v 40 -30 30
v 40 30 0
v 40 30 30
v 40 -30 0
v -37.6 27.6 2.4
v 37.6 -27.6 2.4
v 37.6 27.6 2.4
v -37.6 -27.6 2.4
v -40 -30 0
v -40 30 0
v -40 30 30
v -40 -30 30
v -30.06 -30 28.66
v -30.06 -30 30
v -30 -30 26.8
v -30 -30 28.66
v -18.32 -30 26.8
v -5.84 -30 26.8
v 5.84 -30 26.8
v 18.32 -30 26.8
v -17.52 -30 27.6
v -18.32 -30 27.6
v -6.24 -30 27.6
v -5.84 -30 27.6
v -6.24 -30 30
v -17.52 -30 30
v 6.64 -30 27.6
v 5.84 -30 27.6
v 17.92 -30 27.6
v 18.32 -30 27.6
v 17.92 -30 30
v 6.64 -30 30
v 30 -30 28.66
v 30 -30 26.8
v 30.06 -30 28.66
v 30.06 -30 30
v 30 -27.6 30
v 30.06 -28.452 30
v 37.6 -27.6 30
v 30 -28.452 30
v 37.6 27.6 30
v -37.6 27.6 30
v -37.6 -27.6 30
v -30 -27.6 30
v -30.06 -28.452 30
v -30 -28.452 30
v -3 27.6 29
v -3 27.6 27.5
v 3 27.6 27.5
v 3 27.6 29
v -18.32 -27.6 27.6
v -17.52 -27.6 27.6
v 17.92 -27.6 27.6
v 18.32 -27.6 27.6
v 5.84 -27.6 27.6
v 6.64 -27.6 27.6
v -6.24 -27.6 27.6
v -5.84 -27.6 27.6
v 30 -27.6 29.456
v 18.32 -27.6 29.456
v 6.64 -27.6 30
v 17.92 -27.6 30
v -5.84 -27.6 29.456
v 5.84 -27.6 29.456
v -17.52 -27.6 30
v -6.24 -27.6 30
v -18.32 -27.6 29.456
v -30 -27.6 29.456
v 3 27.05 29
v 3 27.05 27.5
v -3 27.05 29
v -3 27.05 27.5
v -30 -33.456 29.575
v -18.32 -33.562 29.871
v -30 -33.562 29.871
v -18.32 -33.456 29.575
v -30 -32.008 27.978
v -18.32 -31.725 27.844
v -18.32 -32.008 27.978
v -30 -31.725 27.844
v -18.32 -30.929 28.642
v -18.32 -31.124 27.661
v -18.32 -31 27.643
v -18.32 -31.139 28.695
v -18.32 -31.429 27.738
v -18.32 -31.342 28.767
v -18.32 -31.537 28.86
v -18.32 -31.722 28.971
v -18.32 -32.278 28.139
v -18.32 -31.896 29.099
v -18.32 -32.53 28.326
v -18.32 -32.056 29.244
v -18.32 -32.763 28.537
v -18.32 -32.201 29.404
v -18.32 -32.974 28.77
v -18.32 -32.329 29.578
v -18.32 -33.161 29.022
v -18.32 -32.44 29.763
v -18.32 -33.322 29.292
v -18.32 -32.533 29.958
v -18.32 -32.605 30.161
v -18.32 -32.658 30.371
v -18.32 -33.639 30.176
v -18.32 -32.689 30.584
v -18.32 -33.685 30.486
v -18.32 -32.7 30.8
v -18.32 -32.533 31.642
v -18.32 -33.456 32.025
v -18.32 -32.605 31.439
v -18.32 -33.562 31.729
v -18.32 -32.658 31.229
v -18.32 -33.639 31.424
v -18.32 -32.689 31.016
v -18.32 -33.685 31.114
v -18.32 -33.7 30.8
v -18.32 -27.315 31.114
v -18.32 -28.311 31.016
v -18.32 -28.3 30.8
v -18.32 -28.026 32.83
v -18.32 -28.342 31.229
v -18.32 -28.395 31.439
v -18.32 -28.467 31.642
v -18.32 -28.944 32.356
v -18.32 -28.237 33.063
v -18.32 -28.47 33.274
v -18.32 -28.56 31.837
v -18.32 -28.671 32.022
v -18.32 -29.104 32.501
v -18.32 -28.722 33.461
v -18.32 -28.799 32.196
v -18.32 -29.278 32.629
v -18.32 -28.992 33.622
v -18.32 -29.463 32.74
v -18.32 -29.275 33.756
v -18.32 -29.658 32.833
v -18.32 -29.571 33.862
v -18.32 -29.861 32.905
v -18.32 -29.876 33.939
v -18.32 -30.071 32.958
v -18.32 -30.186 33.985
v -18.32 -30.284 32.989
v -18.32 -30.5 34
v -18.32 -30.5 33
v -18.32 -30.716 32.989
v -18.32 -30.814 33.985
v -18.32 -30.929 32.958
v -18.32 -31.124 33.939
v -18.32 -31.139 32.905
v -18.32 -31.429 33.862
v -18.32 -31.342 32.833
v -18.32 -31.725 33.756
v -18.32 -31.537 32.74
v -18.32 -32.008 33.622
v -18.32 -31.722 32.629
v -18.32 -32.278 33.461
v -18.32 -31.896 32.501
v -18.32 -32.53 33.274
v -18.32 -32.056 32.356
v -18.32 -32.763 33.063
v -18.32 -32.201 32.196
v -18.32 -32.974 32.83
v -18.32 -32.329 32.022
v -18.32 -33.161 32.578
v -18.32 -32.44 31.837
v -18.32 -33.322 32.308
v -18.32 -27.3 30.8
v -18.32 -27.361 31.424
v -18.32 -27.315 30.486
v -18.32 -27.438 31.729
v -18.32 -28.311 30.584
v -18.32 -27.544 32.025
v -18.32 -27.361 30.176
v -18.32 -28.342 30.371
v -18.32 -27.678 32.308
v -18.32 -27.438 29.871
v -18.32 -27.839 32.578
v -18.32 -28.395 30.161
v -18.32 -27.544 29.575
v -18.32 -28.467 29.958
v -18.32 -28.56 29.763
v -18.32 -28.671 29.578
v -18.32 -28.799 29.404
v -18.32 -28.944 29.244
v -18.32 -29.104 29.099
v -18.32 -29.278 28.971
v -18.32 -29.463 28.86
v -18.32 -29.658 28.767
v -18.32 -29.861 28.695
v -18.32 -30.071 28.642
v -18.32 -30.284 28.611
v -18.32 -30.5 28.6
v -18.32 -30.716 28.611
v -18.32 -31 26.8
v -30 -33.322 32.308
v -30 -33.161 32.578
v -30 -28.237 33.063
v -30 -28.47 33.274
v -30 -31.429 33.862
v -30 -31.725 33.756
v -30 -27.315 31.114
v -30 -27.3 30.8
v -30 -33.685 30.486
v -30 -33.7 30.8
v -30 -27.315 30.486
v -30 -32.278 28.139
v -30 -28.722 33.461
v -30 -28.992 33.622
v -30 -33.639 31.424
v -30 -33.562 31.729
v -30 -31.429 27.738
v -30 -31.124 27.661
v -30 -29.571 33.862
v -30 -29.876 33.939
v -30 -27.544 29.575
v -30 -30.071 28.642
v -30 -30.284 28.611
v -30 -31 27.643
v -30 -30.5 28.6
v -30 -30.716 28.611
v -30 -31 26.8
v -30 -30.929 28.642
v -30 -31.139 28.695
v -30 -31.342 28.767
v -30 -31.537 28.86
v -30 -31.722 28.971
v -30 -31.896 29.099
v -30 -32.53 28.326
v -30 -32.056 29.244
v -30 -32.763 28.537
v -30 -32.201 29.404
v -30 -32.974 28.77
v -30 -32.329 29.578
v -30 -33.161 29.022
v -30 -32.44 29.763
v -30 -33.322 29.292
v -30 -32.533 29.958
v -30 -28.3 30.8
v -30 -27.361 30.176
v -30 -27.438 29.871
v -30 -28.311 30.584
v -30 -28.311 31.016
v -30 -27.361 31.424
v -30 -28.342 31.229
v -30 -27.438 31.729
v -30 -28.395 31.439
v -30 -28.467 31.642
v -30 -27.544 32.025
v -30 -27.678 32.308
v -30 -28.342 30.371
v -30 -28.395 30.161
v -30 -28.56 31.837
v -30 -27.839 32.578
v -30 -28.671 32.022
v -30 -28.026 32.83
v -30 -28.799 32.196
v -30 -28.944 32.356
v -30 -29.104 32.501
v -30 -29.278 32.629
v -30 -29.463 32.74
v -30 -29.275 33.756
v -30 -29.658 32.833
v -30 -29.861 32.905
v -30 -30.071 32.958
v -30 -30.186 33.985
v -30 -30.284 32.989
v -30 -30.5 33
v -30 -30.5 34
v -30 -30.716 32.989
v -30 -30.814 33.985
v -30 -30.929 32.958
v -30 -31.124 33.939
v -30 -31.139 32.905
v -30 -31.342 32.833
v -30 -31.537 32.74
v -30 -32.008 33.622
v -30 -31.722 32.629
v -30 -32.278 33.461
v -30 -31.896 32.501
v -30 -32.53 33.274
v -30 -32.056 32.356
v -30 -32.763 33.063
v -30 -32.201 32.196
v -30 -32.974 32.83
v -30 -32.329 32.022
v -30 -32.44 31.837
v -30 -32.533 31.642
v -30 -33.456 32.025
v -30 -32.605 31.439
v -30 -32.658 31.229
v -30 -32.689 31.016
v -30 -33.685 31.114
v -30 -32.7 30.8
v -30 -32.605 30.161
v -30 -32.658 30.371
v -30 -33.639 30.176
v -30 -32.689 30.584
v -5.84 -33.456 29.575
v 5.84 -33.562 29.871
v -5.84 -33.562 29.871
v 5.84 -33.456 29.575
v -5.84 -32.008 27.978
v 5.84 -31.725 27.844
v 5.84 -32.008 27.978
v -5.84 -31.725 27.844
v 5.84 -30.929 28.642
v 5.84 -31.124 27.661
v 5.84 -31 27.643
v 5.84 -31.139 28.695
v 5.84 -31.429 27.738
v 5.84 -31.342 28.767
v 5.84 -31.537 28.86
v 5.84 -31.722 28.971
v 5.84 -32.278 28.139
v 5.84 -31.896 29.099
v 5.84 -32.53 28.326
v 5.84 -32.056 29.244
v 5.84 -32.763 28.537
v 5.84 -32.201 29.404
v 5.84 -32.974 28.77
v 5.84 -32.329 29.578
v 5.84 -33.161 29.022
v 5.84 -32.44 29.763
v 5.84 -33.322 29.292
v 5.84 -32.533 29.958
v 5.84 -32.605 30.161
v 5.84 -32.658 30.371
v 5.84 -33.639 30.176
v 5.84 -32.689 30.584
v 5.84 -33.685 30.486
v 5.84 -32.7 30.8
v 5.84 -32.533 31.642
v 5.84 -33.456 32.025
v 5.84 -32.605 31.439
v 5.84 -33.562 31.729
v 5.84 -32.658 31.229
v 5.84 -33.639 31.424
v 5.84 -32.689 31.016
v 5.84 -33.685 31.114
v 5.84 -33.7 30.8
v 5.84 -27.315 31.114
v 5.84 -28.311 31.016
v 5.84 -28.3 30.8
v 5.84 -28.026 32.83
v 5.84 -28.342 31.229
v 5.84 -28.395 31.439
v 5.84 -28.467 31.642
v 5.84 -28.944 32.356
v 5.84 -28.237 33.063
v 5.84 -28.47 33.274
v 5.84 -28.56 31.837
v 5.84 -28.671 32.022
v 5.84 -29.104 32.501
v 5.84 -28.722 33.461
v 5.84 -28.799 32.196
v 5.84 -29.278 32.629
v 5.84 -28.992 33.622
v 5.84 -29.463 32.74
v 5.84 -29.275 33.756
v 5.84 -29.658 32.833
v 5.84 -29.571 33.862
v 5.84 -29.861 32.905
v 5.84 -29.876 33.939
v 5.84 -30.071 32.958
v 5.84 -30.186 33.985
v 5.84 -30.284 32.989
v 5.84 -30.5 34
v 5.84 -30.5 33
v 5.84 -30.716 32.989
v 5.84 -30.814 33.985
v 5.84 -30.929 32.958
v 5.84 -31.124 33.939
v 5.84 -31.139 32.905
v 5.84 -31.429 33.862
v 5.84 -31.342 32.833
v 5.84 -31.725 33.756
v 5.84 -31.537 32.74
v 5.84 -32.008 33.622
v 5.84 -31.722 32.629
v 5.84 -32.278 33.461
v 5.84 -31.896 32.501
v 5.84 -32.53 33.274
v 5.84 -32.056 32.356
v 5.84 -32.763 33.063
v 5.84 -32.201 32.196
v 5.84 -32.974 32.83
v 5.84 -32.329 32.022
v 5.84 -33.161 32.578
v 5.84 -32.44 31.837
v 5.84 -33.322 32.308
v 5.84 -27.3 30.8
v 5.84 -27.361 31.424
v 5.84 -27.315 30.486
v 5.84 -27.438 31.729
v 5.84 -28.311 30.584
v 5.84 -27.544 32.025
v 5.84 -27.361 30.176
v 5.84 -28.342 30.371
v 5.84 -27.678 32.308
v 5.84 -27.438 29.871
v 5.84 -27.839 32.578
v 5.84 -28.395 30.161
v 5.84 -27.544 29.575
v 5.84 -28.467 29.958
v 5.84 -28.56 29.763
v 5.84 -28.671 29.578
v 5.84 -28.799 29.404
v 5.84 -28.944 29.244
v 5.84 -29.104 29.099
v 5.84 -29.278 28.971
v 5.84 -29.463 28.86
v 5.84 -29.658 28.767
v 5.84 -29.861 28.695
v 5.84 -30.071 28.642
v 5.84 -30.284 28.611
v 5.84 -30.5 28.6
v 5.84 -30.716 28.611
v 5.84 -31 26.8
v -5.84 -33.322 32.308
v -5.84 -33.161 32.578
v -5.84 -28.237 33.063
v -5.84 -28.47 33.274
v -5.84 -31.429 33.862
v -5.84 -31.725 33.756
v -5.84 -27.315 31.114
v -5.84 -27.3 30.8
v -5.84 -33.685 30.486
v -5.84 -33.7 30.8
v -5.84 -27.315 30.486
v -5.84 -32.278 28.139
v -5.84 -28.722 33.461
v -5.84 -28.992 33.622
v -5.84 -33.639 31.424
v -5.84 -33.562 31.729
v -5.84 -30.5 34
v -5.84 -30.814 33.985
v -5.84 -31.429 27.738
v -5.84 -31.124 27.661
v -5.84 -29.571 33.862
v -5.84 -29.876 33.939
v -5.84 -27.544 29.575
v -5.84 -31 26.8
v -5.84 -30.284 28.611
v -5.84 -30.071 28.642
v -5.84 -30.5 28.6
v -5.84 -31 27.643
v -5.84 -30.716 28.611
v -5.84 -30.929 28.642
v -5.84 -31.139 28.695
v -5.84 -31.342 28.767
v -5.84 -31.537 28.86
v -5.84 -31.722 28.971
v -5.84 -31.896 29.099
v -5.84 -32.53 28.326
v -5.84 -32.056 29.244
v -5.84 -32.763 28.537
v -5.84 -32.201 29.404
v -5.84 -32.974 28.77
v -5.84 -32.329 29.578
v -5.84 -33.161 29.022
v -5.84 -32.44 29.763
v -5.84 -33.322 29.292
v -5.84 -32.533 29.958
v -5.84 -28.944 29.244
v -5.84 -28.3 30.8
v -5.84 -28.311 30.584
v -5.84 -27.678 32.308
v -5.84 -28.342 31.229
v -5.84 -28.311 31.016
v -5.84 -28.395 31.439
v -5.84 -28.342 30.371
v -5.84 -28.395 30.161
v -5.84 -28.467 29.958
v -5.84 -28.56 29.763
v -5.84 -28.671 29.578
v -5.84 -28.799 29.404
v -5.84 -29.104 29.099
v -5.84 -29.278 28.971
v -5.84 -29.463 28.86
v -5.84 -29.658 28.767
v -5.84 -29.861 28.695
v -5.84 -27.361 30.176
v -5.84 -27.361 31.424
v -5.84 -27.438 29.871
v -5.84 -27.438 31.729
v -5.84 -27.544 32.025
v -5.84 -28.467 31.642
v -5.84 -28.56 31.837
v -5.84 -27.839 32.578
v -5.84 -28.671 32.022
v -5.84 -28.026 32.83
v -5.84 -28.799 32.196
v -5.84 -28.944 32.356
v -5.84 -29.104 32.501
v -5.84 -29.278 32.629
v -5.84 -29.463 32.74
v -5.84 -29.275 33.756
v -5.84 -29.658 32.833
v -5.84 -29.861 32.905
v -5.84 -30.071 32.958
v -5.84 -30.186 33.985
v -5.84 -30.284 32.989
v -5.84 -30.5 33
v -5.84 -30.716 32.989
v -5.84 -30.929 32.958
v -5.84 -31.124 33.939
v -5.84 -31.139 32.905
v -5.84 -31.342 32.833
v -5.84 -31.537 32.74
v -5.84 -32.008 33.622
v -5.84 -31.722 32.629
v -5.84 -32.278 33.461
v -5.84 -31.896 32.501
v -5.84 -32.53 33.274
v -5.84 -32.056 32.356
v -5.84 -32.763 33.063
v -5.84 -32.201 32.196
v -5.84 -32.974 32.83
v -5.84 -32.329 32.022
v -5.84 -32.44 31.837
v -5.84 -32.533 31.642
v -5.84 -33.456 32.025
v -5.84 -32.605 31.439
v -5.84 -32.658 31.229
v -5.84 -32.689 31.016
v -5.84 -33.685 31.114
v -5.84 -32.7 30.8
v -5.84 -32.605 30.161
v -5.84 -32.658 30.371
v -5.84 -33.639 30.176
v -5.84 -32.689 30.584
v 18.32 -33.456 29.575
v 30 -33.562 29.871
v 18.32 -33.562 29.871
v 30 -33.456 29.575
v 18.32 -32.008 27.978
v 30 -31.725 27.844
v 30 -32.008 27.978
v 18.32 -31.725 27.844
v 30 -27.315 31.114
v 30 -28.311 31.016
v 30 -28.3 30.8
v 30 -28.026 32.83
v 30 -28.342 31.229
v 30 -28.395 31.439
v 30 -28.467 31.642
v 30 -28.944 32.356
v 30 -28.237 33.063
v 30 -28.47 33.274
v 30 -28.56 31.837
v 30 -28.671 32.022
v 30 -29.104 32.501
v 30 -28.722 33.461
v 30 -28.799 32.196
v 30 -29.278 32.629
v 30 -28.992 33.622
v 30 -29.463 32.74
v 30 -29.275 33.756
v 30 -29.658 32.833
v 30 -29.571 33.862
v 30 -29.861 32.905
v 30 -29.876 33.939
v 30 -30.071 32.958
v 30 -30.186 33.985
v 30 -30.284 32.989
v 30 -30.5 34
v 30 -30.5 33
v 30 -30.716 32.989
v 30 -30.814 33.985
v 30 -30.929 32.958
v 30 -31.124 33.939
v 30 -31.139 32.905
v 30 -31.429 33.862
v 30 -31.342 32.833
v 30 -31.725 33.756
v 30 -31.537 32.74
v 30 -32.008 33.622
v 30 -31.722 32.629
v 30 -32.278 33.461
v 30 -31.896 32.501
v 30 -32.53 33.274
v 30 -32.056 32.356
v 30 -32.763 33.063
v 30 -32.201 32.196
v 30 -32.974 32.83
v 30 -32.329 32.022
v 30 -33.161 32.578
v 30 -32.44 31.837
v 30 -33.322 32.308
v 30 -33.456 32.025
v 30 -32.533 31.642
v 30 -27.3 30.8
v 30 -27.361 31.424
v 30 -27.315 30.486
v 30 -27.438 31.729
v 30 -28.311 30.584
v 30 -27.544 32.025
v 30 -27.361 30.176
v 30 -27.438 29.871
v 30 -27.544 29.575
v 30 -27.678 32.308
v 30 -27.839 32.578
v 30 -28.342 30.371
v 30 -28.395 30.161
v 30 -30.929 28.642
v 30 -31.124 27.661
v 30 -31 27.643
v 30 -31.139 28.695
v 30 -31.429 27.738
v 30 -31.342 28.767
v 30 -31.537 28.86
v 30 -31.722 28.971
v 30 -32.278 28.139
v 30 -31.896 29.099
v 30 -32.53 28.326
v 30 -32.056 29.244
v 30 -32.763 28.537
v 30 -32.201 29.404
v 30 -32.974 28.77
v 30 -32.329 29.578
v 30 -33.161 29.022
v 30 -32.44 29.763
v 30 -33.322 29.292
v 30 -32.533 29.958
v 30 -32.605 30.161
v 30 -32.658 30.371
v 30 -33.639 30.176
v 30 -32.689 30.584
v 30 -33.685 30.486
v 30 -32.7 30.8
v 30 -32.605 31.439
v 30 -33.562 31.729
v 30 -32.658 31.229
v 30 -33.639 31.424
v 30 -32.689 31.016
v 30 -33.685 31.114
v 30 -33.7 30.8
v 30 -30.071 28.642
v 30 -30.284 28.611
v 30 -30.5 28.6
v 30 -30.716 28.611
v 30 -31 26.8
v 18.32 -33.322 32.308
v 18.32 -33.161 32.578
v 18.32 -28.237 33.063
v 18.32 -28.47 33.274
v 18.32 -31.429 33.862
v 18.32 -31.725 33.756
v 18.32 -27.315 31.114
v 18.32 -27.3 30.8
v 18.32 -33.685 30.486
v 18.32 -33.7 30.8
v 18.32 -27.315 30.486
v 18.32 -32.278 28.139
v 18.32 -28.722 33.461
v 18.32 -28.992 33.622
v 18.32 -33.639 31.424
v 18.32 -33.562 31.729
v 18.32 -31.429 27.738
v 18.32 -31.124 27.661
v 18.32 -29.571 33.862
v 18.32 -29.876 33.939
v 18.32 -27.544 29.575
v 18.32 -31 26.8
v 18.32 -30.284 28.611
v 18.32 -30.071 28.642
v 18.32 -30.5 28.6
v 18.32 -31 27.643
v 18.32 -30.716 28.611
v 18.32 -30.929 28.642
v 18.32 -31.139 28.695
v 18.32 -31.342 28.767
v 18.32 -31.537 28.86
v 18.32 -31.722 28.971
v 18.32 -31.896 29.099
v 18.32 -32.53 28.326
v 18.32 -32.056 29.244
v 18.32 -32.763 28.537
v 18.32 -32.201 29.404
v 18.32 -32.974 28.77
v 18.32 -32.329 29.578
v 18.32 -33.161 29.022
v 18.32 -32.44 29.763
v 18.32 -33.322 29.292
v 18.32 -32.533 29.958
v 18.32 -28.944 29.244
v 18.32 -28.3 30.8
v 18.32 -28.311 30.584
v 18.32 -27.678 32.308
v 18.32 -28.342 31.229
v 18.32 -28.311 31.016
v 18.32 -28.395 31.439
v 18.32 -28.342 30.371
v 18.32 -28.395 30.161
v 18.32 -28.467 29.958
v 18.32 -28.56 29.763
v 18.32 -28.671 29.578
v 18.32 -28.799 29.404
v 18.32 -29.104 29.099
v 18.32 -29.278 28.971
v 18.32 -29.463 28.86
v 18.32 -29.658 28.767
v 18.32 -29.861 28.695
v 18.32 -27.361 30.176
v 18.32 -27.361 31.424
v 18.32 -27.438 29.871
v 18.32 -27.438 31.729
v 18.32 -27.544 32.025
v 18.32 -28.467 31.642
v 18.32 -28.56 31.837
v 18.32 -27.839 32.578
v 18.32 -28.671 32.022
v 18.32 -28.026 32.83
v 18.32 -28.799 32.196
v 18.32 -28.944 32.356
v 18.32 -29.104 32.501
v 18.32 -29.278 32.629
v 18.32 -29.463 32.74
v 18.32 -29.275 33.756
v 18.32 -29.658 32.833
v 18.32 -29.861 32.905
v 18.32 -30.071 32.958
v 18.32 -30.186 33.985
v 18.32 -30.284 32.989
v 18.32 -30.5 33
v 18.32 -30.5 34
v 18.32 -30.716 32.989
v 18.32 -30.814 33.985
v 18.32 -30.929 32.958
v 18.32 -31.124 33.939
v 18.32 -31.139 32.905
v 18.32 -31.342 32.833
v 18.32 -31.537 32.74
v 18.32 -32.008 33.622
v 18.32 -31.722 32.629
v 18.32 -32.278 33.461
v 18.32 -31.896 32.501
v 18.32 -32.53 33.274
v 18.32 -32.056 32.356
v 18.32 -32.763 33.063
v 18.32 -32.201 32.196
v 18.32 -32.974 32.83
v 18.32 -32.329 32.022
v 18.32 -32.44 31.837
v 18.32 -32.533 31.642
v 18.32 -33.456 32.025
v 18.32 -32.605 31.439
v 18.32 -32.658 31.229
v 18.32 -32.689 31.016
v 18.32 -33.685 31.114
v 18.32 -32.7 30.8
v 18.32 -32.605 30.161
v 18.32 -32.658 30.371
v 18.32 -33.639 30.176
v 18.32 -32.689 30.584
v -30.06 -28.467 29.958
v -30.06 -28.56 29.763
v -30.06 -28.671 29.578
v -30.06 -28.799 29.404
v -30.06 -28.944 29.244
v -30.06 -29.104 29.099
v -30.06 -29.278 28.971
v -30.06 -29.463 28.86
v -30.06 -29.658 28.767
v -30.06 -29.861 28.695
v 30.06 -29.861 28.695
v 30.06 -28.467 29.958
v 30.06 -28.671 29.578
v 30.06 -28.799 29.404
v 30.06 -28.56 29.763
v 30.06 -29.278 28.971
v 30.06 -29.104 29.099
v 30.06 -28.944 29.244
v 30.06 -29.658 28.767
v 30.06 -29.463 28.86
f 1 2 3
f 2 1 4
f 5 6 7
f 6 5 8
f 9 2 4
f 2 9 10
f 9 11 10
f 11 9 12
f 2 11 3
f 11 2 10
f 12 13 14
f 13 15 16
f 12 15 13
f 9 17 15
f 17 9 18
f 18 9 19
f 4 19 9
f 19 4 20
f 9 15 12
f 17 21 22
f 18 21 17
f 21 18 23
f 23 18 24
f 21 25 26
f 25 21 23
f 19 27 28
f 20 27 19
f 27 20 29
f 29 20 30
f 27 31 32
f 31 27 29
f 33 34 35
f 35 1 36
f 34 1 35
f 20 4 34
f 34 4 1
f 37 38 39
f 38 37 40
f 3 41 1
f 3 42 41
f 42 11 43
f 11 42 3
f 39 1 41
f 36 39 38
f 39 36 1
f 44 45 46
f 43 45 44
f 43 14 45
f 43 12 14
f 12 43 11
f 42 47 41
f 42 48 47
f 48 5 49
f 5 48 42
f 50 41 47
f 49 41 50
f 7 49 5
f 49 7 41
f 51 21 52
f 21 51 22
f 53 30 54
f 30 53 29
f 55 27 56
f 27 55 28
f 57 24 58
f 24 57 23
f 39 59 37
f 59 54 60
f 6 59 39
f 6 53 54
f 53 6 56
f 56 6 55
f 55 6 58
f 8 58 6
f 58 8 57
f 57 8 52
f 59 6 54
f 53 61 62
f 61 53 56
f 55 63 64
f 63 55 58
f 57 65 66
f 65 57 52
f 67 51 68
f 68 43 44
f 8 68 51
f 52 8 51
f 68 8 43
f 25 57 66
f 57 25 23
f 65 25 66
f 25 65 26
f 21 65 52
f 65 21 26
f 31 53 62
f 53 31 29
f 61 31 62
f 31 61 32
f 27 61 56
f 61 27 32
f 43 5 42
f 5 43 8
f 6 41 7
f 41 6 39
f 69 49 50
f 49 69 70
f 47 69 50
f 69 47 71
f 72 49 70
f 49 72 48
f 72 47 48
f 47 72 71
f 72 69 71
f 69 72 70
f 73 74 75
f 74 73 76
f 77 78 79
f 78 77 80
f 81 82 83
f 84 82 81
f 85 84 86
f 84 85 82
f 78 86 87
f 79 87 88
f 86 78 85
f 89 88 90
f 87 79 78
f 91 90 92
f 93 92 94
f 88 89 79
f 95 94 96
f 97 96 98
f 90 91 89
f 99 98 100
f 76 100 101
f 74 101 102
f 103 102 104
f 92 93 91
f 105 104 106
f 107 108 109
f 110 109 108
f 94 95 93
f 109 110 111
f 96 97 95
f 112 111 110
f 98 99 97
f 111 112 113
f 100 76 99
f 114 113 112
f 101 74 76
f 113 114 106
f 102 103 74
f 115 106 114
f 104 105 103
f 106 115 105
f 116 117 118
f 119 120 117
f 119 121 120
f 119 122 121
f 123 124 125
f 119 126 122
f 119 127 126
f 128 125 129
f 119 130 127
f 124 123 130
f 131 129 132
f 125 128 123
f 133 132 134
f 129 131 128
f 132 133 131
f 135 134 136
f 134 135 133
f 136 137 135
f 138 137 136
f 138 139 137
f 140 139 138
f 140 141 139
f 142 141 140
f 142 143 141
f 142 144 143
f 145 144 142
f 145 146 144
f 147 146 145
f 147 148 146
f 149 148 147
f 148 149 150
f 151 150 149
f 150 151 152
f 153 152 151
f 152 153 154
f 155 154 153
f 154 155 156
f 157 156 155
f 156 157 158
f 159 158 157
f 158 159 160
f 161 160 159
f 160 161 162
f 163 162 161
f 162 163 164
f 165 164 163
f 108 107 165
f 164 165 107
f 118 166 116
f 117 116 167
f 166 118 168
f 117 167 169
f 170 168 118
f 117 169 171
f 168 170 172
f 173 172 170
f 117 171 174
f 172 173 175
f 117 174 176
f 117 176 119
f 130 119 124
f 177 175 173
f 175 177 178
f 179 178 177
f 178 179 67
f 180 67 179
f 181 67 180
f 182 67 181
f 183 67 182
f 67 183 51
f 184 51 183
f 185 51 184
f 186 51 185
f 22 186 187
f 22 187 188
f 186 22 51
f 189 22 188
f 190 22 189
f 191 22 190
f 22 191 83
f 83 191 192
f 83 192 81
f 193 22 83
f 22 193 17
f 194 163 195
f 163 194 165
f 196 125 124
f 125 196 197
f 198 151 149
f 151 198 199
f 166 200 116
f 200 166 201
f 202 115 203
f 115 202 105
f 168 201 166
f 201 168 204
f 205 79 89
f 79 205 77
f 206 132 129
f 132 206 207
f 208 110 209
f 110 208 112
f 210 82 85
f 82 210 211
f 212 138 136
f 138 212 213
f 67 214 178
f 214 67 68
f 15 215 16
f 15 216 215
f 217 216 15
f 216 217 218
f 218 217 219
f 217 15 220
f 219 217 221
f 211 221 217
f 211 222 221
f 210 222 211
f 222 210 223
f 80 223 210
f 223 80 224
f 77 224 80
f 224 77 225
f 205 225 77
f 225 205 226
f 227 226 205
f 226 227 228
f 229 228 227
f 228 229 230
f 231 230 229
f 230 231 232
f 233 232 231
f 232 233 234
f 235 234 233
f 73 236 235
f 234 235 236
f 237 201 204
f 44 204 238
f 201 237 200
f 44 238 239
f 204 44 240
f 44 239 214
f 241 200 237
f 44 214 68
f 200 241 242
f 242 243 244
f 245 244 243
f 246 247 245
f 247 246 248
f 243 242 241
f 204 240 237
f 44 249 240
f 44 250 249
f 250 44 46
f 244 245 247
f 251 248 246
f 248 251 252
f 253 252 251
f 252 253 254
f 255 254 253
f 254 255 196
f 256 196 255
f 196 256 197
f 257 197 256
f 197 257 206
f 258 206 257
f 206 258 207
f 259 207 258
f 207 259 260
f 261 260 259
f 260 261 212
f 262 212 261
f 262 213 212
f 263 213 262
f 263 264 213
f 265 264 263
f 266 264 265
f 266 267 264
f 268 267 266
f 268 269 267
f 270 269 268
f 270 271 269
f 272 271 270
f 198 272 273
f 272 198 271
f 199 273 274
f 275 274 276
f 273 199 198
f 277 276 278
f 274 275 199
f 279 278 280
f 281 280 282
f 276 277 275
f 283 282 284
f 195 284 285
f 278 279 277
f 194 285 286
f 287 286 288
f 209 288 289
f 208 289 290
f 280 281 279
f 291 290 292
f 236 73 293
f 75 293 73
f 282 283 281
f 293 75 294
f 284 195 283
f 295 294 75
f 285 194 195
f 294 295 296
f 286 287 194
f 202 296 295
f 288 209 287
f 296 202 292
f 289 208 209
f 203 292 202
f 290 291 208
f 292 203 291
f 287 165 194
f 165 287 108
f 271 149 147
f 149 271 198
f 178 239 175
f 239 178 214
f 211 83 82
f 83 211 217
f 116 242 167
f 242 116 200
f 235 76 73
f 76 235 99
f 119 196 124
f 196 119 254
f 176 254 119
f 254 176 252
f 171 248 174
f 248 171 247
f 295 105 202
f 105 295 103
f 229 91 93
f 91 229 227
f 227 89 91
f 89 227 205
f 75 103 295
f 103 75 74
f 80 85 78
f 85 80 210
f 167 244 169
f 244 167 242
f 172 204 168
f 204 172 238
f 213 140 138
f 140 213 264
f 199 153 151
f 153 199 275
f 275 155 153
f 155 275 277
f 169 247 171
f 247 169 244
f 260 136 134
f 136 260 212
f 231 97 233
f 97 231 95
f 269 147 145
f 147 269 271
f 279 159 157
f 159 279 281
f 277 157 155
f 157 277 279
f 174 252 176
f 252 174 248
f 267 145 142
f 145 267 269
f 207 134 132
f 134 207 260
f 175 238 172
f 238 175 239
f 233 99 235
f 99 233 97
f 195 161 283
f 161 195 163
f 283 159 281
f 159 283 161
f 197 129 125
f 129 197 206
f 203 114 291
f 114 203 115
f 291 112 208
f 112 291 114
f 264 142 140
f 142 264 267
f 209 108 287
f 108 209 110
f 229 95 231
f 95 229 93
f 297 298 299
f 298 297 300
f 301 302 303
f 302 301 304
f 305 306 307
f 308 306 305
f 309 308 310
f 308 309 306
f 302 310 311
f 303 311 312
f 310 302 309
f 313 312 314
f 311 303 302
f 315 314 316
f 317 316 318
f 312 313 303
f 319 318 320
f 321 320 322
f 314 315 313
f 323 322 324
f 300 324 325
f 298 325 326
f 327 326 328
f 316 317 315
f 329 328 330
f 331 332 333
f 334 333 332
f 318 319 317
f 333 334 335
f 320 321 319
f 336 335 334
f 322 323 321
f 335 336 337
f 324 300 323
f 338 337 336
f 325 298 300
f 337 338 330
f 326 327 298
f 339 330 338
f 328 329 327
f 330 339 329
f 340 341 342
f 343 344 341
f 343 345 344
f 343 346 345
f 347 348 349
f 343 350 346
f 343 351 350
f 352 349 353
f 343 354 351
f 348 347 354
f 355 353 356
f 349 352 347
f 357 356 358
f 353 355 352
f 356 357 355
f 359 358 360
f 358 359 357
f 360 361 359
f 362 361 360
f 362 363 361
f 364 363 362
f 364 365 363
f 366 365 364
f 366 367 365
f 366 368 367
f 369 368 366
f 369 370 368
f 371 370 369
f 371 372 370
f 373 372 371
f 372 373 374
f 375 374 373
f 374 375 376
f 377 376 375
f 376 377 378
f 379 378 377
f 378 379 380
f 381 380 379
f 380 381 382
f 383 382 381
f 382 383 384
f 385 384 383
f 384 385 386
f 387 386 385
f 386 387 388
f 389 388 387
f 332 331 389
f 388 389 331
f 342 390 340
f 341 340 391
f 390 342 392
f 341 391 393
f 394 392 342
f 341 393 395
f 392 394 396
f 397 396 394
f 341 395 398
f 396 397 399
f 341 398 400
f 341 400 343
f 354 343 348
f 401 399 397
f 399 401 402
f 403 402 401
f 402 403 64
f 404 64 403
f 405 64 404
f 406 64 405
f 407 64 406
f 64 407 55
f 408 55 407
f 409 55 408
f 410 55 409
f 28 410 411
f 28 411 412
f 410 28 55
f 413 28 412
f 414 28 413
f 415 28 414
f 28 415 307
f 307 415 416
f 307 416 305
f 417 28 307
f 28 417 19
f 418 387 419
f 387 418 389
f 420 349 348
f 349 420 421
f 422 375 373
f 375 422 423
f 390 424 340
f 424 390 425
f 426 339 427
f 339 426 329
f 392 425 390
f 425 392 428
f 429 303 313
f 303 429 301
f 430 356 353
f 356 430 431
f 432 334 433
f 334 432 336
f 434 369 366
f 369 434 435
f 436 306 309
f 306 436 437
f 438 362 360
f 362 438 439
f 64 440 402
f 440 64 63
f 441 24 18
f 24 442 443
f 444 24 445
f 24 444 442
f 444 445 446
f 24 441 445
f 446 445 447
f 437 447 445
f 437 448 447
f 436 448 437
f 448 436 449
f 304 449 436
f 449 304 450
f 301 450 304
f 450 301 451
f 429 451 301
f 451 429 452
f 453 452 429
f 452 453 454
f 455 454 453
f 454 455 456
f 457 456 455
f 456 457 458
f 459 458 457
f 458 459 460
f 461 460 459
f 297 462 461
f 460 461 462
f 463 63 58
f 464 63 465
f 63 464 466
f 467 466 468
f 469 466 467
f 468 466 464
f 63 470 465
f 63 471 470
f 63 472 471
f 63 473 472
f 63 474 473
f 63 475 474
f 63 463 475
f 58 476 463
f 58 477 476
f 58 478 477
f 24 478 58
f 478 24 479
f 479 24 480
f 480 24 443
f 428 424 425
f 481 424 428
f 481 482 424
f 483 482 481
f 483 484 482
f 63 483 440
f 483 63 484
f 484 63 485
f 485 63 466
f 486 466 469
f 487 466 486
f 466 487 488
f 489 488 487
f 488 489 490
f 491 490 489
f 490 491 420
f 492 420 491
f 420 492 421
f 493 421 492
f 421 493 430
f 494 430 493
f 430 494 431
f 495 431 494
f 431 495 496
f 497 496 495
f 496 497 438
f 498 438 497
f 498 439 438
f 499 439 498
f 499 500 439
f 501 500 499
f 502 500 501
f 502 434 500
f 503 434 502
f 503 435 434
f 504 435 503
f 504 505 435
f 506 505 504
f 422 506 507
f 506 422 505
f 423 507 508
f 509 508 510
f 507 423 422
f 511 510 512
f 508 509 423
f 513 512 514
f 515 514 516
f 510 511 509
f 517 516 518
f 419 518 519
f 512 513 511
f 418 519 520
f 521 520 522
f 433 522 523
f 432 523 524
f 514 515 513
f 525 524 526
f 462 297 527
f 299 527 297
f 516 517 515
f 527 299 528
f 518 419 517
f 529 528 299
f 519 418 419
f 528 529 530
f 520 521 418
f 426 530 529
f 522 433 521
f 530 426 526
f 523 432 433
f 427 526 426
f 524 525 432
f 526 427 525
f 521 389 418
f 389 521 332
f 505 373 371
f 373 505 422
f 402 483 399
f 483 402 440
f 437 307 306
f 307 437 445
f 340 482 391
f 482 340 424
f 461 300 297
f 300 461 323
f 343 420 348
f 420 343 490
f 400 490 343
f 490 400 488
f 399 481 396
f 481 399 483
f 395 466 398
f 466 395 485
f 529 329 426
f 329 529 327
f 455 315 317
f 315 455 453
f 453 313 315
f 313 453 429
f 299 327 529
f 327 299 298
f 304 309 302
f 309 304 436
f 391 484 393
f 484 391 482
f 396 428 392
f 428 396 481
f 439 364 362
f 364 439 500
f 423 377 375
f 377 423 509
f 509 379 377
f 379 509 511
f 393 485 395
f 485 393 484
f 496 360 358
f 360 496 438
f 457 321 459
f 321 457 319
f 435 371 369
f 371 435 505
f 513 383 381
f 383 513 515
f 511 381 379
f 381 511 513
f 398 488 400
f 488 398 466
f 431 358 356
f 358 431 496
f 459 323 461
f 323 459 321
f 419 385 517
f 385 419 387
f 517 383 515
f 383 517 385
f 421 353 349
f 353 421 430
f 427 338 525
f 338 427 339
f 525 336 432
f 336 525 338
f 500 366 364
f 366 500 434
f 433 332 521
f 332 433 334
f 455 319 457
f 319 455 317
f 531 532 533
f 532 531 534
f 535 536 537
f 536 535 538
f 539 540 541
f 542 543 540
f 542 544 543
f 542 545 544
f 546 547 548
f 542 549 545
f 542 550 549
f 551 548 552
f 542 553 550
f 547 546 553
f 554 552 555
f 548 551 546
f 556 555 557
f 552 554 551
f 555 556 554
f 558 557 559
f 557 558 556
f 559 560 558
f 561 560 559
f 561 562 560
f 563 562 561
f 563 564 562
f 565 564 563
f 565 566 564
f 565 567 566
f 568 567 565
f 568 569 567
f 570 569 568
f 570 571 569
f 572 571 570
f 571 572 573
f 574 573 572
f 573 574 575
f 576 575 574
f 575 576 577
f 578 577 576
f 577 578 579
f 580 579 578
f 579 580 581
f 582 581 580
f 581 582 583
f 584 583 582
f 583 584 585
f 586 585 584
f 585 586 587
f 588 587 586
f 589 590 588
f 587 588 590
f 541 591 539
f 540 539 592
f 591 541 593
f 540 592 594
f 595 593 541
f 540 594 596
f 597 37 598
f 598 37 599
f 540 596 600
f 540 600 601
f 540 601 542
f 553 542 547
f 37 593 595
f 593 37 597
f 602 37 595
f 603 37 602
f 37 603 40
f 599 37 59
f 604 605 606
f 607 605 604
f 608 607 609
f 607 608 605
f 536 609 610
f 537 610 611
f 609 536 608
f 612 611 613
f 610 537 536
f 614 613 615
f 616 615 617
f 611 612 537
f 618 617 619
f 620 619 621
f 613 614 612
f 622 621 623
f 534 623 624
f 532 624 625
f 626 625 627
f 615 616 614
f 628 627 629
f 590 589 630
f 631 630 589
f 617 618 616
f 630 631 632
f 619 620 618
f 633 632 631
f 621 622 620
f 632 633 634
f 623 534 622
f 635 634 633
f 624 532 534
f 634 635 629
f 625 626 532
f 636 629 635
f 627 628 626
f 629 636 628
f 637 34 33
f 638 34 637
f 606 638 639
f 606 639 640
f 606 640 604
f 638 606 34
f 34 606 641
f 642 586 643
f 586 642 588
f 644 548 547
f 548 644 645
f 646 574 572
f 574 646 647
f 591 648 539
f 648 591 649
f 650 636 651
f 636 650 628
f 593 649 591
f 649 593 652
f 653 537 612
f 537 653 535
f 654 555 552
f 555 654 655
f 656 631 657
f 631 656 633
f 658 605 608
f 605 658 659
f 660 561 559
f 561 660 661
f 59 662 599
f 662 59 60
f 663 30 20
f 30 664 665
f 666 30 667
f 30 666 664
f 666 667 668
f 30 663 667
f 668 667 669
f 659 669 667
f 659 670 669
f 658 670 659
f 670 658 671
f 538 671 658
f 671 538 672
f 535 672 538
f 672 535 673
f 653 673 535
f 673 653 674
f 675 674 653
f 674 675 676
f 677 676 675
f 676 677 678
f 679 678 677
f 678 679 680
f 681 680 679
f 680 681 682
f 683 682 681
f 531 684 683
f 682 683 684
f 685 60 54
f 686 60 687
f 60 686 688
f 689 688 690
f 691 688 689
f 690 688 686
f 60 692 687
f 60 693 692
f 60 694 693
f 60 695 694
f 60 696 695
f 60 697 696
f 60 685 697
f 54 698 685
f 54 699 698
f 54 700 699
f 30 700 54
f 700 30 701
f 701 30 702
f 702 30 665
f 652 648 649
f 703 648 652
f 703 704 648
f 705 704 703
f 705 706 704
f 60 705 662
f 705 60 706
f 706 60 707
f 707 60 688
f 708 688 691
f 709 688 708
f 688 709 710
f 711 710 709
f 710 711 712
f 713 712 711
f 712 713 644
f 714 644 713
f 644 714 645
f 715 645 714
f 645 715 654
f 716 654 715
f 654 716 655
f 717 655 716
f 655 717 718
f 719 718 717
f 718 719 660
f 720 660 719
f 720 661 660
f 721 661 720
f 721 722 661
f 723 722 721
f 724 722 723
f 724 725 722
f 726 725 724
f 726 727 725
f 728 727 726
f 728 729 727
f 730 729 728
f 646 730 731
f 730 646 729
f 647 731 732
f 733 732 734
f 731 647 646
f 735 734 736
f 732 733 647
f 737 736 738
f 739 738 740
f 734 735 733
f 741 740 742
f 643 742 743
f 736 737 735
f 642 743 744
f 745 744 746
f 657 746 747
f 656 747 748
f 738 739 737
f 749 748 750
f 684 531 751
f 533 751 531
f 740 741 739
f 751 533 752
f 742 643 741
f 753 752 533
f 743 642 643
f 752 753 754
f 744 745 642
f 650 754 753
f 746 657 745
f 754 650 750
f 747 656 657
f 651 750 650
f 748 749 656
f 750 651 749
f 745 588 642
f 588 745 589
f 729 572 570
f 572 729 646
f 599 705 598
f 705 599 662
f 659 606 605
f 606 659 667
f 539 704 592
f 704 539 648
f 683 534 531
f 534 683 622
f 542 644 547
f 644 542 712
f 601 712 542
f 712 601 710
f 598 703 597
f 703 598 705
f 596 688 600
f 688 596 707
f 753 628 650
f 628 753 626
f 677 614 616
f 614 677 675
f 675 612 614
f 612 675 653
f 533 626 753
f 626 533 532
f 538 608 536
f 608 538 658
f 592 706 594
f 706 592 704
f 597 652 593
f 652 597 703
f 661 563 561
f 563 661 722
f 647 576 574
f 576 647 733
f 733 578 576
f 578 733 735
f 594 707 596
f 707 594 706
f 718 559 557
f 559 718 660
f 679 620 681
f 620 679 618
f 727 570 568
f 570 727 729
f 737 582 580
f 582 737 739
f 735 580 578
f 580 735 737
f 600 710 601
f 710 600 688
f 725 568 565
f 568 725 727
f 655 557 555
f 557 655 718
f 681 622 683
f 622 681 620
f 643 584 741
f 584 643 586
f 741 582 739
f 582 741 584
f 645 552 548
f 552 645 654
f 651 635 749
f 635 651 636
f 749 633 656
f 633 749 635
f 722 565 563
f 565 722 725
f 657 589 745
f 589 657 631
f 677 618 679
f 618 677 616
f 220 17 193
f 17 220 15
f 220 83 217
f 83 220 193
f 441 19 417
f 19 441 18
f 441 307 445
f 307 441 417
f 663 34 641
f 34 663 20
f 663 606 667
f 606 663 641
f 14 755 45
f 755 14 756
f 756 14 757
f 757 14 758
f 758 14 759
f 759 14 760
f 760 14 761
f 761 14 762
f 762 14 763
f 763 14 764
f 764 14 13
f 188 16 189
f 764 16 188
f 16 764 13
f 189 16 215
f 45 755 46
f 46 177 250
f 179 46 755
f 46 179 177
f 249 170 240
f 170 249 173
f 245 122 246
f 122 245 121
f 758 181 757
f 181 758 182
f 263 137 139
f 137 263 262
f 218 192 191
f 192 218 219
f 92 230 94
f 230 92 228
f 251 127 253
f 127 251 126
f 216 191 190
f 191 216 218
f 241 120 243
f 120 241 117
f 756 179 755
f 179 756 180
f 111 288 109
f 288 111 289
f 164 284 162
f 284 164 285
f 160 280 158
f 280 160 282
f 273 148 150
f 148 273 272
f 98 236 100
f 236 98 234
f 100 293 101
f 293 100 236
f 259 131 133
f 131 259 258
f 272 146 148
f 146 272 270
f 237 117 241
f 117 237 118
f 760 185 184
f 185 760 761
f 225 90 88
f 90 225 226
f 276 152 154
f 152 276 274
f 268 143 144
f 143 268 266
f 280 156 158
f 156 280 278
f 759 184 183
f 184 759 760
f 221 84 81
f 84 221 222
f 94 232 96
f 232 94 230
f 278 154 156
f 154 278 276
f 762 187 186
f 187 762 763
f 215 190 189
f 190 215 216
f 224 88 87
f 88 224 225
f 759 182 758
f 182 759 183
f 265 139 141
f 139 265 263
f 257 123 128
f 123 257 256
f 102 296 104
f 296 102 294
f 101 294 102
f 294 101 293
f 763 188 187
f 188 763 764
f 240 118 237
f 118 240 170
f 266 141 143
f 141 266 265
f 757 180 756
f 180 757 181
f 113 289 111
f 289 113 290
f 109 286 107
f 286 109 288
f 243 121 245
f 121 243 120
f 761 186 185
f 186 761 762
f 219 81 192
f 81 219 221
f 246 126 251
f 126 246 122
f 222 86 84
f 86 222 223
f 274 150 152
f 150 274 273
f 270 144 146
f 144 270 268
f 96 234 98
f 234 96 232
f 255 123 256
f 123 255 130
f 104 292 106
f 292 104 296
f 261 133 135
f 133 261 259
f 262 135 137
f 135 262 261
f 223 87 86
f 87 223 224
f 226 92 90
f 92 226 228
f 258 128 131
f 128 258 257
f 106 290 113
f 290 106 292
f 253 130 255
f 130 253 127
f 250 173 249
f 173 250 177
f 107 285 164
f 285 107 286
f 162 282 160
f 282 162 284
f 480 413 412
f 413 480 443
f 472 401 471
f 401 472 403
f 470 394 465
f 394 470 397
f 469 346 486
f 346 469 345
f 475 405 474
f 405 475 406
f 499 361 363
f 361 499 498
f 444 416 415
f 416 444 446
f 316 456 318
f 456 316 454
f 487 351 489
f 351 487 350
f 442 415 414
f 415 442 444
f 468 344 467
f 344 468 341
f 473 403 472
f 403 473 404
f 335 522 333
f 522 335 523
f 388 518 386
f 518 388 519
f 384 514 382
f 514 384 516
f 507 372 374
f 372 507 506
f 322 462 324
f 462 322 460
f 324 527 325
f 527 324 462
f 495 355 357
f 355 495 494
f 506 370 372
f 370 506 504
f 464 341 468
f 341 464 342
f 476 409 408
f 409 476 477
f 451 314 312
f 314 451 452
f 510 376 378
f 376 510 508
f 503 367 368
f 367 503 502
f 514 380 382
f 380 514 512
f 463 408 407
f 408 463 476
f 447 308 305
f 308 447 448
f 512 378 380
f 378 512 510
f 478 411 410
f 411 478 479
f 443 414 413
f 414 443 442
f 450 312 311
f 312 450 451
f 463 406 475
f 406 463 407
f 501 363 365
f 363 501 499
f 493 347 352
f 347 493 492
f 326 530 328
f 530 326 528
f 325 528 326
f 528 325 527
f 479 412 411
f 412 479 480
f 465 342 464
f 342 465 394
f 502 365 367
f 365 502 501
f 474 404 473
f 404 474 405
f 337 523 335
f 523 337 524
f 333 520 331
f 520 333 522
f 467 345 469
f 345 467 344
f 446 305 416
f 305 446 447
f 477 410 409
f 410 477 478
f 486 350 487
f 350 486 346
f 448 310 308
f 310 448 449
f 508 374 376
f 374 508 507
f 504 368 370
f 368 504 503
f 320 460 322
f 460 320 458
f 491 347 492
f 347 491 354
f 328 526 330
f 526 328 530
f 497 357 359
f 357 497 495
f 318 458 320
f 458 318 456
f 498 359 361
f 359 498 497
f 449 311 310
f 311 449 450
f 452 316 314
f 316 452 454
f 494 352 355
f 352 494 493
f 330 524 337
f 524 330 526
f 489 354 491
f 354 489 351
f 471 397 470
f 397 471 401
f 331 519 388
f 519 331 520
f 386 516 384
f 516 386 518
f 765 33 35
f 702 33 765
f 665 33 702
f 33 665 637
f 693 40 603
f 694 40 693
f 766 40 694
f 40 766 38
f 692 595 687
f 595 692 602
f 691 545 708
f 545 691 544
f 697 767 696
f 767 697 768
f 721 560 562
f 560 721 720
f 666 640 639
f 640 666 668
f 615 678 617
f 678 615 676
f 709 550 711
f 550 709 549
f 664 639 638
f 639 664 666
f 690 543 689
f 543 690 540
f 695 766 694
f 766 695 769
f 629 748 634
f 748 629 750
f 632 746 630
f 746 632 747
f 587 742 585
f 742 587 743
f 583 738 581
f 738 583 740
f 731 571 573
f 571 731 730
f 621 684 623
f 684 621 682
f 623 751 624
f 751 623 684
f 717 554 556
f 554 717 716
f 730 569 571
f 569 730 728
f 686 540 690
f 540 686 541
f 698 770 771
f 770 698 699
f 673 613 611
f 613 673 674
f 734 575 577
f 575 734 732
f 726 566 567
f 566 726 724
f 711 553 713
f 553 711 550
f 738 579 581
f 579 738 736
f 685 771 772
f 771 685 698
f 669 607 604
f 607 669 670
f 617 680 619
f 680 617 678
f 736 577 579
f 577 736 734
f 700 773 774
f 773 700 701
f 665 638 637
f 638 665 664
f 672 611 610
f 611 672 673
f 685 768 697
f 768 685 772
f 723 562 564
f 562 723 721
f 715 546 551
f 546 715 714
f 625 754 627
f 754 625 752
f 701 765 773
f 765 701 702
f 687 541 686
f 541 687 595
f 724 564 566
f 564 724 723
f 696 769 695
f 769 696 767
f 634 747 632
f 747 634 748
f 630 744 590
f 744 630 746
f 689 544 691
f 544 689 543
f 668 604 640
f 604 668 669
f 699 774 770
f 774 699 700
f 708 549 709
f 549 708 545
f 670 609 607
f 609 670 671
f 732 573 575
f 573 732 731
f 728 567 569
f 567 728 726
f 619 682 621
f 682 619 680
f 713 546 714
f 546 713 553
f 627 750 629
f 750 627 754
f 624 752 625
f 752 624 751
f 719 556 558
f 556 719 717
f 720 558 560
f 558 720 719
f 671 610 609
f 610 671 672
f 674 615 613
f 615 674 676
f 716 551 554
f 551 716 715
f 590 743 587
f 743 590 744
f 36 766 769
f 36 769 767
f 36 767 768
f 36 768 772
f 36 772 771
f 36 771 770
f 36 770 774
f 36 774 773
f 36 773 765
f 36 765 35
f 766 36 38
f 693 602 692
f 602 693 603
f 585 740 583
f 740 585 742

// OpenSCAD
// Box with print-in-place hinge (v4: bridge webs to kill band overhangs)
part = "box";
// [box, lid, pin, assembly]
cadverify_only = "";
module instance(name, part, unit = 1) {
    echo(cadverify_instance = [name, part, unit]);
    if (cadverify_only == "" || cadverify_only == name) children();
}

Rkn = 3.2; rbore = 2.2; rpin = 1.9;
yh = -30.5; zh = 30.8;
lid_zh = 3.4;
lid_lift = 27.4;
pin_lift_z = 27.8; pin_shift_y = -30.5;
k0x0=-30; k0x1=-18.32;
k1x0=-17.92; k1x1=-6.24;
k2x0=-5.84; k2x1=5.84;
k3x0=6.24; k3x1=17.92;
k4x0=18.32; k4x1=30;

$fn = 64;

module xcyl(x0, x1, r, y, z) {
    translate([x0, y, z]) rotate([0, 90, 0]) cylinder(r = r, h = x1 - x0);
}

module box_part() {
    difference() {
        union() {
            translate([-40, -30, 0]) cube([80, 60, 2.4]);
            translate([-40, 27.6, 2.4]) cube([80, 2.4, 27.6]);
            translate([-40, -30, 2.4]) cube([80, 2.4, 27.6 - 2.4]);
            // top band of back wall split into segs clearing lid knuckles axially (0.4 gap each side)
            translate([-40, -30, 27.0]) cube([11.88, 2.4, 3.0]);
            translate([-17.52, -30, 27.0]) cube([11.28, 2.4, 3.0]);
            translate([6.64, -30, 27.0]) cube([11.28, 2.4, 3.0]);
            translate([28.12, -30, 27.0]) cube([11.88, 2.4, 3.0]);
            translate([-40, -27.6, 2.4]) cube([2.4, 55.2, 27.6]);
            translate([37.6, -27.6, 2.4]) cube([2.4, 55.2, 27.6]);
            translate([-3, 27.05, 27.5]) cube([6, 0.6, 1.5]);
            // hinge knuckles + support webs tying them to the back wall
            xcyl(k0x0, k0x1, Rkn, yh, zh);
            xcyl(k2x0, k2x1, Rkn, yh, zh);
            xcyl(k4x0, k4x1, Rkn, yh, zh);
            translate([k0x0, -31, 26.8]) cube([k0x1-k0x0, 3.4, 4.0]);
            translate([k2x0, -31, 26.8]) cube([k2x1-k2x0, 3.4, 4.0]);
            translate([k4x0, -31, 26.8]) cube([k4x1-k4x0, 3.4, 4.0]);
        }
        xcyl(k0x0-0.06, k0x1+0.06, rbore, yh, zh);
        xcyl(k2x0-0.06, k2x1+0.06, rbore, yh, zh);
        xcyl(k4x0-0.06, k4x1+0.06, rbore, yh, zh);
    }
}

module lid_part() {
    difference() {
        union() {
            translate([-40, -30, 10.6]) cube([80, 60, 2.4]);
            translate([-40, 27.6, 3]) cube([80, 2.4, 7.6]);
            translate([-17.92, -30, 3]) cube([11.68, 2.4, 7.6]);
            translate([6.24, -30, 3]) cube([11.68, 2.4, 7.6]);
            translate([-40, -30, 3]) cube([9.6, 2.4, 7.6]);
            translate([-5.44, -30, 3]) cube([10.88, 2.4, 7.6]);
            translate([18.72, -30, 3]) cube([10.88, 2.4, 7.6]);
            translate([30.4, -30, 3]) cube([9.6, 2.4, 7.6]);
            translate([-40, -27.6, 3]) cube([2.4, 55.2, 7.6]);
            translate([37.6, -27.6, 3]) cube([2.4, 55.2, 7.6]);
            translate([-37.2, 25.2, 0]) cube([74.4, 2.0, 10.6]);
            translate([-37.2, -27.2, 0]) cube([74.4, 2.0, 10.6]);
            translate([-37.2, -25.2, 0]) cube([2.0, 50.4, 10.6]);
            translate([35.2, -25.2, 0]) cube([2.0, 50.4, 10.6]);
            xcyl(k1x0, k1x1, Rkn, yh, lid_zh);
            xcyl(k3x0, k3x1, Rkn, yh, lid_zh);
            translate([k1x0, -31, 0]) cube([k1x1-k1x0, 3.4, 5]);
            translate([k3x0, -31, 0]) cube([k3x1-k3x0, 3.4, 5]);
        }
        xcyl(k1x0-0.06, k1x1+0.06, rbore, yh, lid_zh);
        xcyl(k3x0-0.06, k3x1+0.06, rbore, yh, lid_zh);
        translate([-3.25, 26.5, -0.05]) cube([6.5, 1.35, 2.05]);
    }
}

module pin_part() {
    union() {
        xcyl(-32.4, 32.4, rpin, 0, 3);
        xcyl(30.4, 32.4, 3, 0, 3);
        xcyl(-32.4, -30.4, 3, 0, 3);
    }
}

if (part == "box") {
    echo(cadverify_spec = [
        ["bounds", [[-40, -33.7, 0], [40, 30, 34.0]]],
        ["bodies", 1],
        ["through_holes", 3],
        ["support_faces", [["bed", "-z", 4000]]],
        ["overhangs_allowed", [["hinge knuckles, bores and wall cutouts print in place", [[-30.2, -33.9, 26.5], [30.2, -27.1, 33.5]]], ["catch bump underside, tiny 3.6 mm2 ledge", [[-3.2, 26.8, 27.3], [3.2, 27.8, 27.7]]]]],
        ["copies", 1],
        ["details", [
            ["floor", "thickness", [0, 0, -1], [0, 0, 1], 2.4],
            ["front_wall", "thickness", [0, 31, 15], [0, -1, 0], 2.4],
            ["cavity", "void", [[-37.6, -27.6, 2.4], [37.6, 27.6, 29.9]], 0.9],
            ["hinge_bore", "hole", [-31, -30.5, 30.8], [1, 0, 0], [[0, 4.4], [11.6, 4.4]]],
            ["catch_bump", "material", [[-3, 27.05, 27.5], [3, 27.6, 29.0]], 0.9],
            ["hinge_view", "view", [[-30, -34, 26.5], [30, -27, 34.5]]]
        ]]
    ]);
    box_part();
} else if (part == "lid") {
    echo(cadverify_spec = [
        ["bounds", [[-40, -33.7, 0], [40, 30, 13]]],
        ["bodies", 1],
        ["through_holes", 2],
        ["support_faces", [["bed", "-z", 300]]],
        ["overhangs_allowed", [
            ["hinge knuckles and bores print in place", [[-18.2, -33.9, 0], [18.2, -27.1, 4.2]]],
            ["lid top bridging over plug cavity", [[-37.2, -24.9, 10.1], [37.2, 25.2, 11.1]]]
        ]],
        ["copies", 1],
        ["details", [
            ["top", "thickness", [0, 0, 14], [0, 0, -1], 2.4],
            ["skirt", "thickness", [0, 31, 6], [0, -1, 0], 2.4],
            ["plug_cavity", "void", [[-35.2, -24.9, 0], [35.2, 25.2, 10.5]], 0.9],
            ["hinge_bore", "hole", [-18.6, -30.5, 3.4], [1, 0, 0], [[0, 4.4], [11.6, 4.4]]],
            ["catch_notch", "void", [[-3.25, 26.5, 0], [3.25, 27.85, 2.0]], 0.9],
            ["catch_view", "view", [[-5, 26.3, 0], [5, 28.5, 3]]]
        ]]
    ]);
    lid_part();
} else if (part == "pin") {
    echo(cadverify_spec = [
        ["bounds", [[-32.4, -3, 0], [32.4, 3, 6]]],
        ["bodies", 1],
        ["support_faces", []],
        ["overhangs_allowed", [["pin shaft underside bridges with 0.3 gap", [[-32.4, -1.9, 0], [32.4, 1.9, 1.6]]]]],
        ["copies", 1],
        ["details", [
            ["shaft", "thickness", [0, 3, 3], [0, -1, 0], 3.8],
            ["head", "material", [[30.4, -3, 0], [32.4, 3, 6]], 0.7],
            ["pin_view", "view", [[-32.4, -3, 0], [32.4, 3, 6]]]
        ]]
    ]);
    pin_part();
} else if (part == "assembly") {
    echo(cadverify_spec = [
        ["bounds", [[-40, -33.7, 0], [40, 30, 40.4]]],
        ["support_faces", [["bed", "-z", 4000]]],
        ["allowed_interferences", []],
        ["motions", [
            ["lid_open", ["lid"], "rotate", [0, -30.5, 30.8], [1, 0, 0], [0, 110], ["flex", [["lid", "box", 0.5, "catch bump clearance pass"]]]]
        ]],
        ["assembly_order", [
            [["box"], [0, 0, 0]],
            [["lid"], [0, 0, -1]],
            [["pin"], [1, 0, 0]]
        ]],
        ["print_in_place", 0.3],
        ["overhangs_allowed", [
            ["hinge undersides, pin bridge and cutouts in place", [[-33, -34, 26.5], [33, -27, 34.8]]],
            ["lid top bridging over box cavity", [[-37.2, -24.9, 37.5], [37.2, 25.2, 38.5]]],
            ["front lid skirt band over box rim, 0.4 gap flat bridge", [[-40.2, -30.2, 30.2], [40.2, 30.2, 30.6]]],
            ["lid plug bottom face over print gap, flat bridge", [[-37.4, -27.4, 27.2], [37.4, 27.4, 27.6]]],
            ["lid skirt inner ledge over box rim, flat bridge", [[-37.8, -30.2, 37.8], [37.8, 27.8, 38.2]]],
            ["notch top face over notch void, tiny bridge", [[-3.5, 26.3, 29.2], [3.5, 28.0, 29.6]]],
            ["catch bump underside, tiny 3.6 mm2 ledge", [[-3.2, 26.9, 27.3], [3.2, 27.8, 27.7]]]
        ]]
    ]);
    instance("box", "box") box_part();
    instance("lid", "lid") translate([0, 0, lid_lift]) lid_part();
    instance("pin", "pin") translate([0, pin_shift_y, pin_lift_z]) pin_part();
}
